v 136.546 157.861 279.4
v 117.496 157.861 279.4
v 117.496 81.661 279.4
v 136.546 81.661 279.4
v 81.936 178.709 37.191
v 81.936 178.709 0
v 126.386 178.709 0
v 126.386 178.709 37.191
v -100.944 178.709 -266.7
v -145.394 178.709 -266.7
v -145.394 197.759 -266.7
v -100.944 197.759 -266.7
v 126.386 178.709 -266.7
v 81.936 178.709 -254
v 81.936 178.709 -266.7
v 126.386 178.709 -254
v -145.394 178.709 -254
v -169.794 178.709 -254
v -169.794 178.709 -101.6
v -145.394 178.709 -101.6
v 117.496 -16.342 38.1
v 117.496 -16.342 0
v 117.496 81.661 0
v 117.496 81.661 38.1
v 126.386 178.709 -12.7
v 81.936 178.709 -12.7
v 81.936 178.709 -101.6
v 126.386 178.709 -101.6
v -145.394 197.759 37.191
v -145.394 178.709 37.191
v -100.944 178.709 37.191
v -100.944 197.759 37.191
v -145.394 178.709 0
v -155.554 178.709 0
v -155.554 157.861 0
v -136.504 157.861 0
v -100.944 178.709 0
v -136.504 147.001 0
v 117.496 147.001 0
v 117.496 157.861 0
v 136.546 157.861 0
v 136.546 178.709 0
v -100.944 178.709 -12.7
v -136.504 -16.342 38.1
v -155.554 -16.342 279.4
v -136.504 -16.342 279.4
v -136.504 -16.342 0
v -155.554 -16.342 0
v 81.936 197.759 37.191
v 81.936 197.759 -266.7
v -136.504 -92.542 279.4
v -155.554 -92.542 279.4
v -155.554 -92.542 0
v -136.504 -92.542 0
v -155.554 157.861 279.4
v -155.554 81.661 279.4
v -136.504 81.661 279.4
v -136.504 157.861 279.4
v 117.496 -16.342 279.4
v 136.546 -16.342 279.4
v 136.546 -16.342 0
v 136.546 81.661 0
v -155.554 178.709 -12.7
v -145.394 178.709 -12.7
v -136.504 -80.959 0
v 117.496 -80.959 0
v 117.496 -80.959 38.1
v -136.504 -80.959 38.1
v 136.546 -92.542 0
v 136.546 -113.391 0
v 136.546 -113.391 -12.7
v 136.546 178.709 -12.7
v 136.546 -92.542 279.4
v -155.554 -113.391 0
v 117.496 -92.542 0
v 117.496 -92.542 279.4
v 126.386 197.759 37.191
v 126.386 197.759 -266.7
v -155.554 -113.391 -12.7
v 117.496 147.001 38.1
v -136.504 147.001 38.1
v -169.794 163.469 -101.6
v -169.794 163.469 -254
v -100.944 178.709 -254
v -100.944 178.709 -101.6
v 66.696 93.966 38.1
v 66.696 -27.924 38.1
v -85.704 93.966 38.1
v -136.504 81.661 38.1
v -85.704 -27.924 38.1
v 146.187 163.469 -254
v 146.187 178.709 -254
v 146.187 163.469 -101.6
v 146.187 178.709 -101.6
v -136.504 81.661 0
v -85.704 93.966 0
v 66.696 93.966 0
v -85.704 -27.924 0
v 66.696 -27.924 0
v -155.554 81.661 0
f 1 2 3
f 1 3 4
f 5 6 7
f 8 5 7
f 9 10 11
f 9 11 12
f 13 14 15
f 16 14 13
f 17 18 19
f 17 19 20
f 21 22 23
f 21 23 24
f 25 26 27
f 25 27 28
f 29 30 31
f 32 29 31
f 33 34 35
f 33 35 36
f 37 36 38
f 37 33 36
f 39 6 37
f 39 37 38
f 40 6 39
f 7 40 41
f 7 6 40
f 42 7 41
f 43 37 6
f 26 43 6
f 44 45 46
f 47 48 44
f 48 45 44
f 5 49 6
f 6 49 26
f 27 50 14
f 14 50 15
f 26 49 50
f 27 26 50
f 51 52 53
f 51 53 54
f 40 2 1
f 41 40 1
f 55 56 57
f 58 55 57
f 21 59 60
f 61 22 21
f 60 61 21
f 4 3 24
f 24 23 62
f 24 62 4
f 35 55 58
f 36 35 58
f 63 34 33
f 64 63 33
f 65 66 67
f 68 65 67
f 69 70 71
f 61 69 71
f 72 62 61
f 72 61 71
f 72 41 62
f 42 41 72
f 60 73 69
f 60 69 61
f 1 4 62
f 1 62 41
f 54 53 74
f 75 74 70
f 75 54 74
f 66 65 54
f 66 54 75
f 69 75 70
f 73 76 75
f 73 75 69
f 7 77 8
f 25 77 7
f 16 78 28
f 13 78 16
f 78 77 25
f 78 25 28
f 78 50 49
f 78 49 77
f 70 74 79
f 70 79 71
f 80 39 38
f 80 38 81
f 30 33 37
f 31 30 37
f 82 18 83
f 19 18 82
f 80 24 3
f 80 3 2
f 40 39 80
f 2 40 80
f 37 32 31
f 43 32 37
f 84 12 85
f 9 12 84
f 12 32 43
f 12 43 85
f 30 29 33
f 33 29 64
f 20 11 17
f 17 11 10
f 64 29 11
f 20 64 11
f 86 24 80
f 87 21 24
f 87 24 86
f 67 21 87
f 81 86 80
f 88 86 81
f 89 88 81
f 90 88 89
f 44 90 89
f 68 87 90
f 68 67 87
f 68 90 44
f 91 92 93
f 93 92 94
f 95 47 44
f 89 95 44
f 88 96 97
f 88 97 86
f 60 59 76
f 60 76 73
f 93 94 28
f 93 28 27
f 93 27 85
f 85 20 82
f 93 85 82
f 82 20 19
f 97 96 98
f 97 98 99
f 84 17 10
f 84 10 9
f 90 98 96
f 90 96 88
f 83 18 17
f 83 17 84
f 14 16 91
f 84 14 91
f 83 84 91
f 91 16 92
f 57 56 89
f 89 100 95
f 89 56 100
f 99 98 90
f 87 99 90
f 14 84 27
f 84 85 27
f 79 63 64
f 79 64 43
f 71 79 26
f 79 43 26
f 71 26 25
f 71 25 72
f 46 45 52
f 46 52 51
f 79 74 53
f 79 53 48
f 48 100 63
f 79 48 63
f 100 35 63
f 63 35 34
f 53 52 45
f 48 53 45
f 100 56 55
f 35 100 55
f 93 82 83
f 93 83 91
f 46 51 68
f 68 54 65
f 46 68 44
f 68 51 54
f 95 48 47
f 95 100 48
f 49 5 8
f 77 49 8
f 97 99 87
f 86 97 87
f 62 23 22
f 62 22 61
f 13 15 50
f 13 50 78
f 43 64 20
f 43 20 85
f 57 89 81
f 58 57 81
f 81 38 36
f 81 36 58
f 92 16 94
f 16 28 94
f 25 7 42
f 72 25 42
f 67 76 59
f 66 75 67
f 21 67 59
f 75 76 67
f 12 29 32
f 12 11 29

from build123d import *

# Parameters (mm, degrees)
F0_W           = 292.1
F0_H           = 292.1
F1_DEPTH       = 12.7
F3_W           = 19.05
F3_H           = 76.2
F4_DEPTH       = 279.4
F6_W           = 53.0352
F6_H           = 38.1
F7_DEPTH       = 254
F9_W           = 50.8
F9_H           = 38.1
F10_DEPTH      = 121.8899004574
F11_W          = 44.45
F11_H          = 19.05
F12_DEPTH      = 254
F12_DEPTH_BACK = 49.89103
F13_W          = 19.8010608381
F13_H          = 152.4
F13_W_2        = 44.45
F13_W_3        = 251.7297603481
F14_DEPTH      = 15.24


with BuildPart() as f1:
    # F0 (on Top) → F1 (new body)
    with BuildSketch(Plane.XY):
        with Locations((-9.5041804016, 32.6594091807)):
            Rectangle(F0_W, F0_H)
    extrude(amount=-F1_DEPTH)

    # F3 (on face) → F4 (join)
    with BuildSketch(Plane.XY):
        with Locations((127.0208195984, -54.4418936728)):
            Rectangle(F3_W, F3_H)
        with Locations((127.0208195984, 119.7607120342)):
            Rectangle(F3_W, F3_H)
        with Locations((-146.0291804016, -54.4418936728)):
            Rectangle(F3_W, F3_H)
        with Locations((-146.0291804016, 119.7607120342)):
            Rectangle(F3_W, F3_H)
    extrude(amount=F4_DEPTH)

    # F6 (on face) → F7 (join, through all)
    with BuildSketch(Plane(origin=(117.4958195984, 0, 0), x_dir=(0, -1, 0), z_dir=(-1, 0, 0))):
        with Locations((54.4418936728, 19.05)):
            Rectangle(F6_W, F6_H)
        with Locations((-120.4832067846, 19.05)):
            Rectangle(F6_W, F6_H)
    extrude(amount=F7_DEPTH)

    # F9 (on face) → F10 (join, through all)
    with BuildSketch(Plane(origin=(0, -27.9242936728, 0), x_dir=(-1, 0, 0), z_dir=(0, 1, 0))):
        with Locations((-92.0958195984, 19.05)):
            Rectangle(F9_W, F9_H)
        with Locations((111.1041804016, 19.05)):
            Rectangle(F9_W, F9_H)
    extrude(amount=F10_DEPTH)

    # F11 (on face) → F12 (join, two sides)
    with BuildSketch(Plane(origin=(0, 0, -12.7), x_dir=(1, 0, 0), z_dir=(0, 0, -1))) as f12_sk:
        with Locations((104.1608195984, -188.2344091807)):
            Rectangle(F11_W, F11_H)
        with Locations((-123.1691804016, -188.2344091807)):
            Rectangle(F11_W, F11_H)
    extrude(amount=F12_DEPTH)
    extrude(f12_sk.sketch, amount=-F12_DEPTH_BACK)

    # F13 (on face) → F14 (join)
    with BuildSketch(Plane.XZ.offset(-178.7094091807)):
        with Locations((136.2863500175, -177.8)):
            Rectangle(F13_W, F13_H)
        with Locations((104.1608195984, -177.8)):
            Rectangle(F13_W_2, F13_H)
        with Locations((-43.9290605756, -177.8)):
            Rectangle(F13_W_3, F13_H)
    extrude(amount=F14_DEPTH)


solid = f1.part
